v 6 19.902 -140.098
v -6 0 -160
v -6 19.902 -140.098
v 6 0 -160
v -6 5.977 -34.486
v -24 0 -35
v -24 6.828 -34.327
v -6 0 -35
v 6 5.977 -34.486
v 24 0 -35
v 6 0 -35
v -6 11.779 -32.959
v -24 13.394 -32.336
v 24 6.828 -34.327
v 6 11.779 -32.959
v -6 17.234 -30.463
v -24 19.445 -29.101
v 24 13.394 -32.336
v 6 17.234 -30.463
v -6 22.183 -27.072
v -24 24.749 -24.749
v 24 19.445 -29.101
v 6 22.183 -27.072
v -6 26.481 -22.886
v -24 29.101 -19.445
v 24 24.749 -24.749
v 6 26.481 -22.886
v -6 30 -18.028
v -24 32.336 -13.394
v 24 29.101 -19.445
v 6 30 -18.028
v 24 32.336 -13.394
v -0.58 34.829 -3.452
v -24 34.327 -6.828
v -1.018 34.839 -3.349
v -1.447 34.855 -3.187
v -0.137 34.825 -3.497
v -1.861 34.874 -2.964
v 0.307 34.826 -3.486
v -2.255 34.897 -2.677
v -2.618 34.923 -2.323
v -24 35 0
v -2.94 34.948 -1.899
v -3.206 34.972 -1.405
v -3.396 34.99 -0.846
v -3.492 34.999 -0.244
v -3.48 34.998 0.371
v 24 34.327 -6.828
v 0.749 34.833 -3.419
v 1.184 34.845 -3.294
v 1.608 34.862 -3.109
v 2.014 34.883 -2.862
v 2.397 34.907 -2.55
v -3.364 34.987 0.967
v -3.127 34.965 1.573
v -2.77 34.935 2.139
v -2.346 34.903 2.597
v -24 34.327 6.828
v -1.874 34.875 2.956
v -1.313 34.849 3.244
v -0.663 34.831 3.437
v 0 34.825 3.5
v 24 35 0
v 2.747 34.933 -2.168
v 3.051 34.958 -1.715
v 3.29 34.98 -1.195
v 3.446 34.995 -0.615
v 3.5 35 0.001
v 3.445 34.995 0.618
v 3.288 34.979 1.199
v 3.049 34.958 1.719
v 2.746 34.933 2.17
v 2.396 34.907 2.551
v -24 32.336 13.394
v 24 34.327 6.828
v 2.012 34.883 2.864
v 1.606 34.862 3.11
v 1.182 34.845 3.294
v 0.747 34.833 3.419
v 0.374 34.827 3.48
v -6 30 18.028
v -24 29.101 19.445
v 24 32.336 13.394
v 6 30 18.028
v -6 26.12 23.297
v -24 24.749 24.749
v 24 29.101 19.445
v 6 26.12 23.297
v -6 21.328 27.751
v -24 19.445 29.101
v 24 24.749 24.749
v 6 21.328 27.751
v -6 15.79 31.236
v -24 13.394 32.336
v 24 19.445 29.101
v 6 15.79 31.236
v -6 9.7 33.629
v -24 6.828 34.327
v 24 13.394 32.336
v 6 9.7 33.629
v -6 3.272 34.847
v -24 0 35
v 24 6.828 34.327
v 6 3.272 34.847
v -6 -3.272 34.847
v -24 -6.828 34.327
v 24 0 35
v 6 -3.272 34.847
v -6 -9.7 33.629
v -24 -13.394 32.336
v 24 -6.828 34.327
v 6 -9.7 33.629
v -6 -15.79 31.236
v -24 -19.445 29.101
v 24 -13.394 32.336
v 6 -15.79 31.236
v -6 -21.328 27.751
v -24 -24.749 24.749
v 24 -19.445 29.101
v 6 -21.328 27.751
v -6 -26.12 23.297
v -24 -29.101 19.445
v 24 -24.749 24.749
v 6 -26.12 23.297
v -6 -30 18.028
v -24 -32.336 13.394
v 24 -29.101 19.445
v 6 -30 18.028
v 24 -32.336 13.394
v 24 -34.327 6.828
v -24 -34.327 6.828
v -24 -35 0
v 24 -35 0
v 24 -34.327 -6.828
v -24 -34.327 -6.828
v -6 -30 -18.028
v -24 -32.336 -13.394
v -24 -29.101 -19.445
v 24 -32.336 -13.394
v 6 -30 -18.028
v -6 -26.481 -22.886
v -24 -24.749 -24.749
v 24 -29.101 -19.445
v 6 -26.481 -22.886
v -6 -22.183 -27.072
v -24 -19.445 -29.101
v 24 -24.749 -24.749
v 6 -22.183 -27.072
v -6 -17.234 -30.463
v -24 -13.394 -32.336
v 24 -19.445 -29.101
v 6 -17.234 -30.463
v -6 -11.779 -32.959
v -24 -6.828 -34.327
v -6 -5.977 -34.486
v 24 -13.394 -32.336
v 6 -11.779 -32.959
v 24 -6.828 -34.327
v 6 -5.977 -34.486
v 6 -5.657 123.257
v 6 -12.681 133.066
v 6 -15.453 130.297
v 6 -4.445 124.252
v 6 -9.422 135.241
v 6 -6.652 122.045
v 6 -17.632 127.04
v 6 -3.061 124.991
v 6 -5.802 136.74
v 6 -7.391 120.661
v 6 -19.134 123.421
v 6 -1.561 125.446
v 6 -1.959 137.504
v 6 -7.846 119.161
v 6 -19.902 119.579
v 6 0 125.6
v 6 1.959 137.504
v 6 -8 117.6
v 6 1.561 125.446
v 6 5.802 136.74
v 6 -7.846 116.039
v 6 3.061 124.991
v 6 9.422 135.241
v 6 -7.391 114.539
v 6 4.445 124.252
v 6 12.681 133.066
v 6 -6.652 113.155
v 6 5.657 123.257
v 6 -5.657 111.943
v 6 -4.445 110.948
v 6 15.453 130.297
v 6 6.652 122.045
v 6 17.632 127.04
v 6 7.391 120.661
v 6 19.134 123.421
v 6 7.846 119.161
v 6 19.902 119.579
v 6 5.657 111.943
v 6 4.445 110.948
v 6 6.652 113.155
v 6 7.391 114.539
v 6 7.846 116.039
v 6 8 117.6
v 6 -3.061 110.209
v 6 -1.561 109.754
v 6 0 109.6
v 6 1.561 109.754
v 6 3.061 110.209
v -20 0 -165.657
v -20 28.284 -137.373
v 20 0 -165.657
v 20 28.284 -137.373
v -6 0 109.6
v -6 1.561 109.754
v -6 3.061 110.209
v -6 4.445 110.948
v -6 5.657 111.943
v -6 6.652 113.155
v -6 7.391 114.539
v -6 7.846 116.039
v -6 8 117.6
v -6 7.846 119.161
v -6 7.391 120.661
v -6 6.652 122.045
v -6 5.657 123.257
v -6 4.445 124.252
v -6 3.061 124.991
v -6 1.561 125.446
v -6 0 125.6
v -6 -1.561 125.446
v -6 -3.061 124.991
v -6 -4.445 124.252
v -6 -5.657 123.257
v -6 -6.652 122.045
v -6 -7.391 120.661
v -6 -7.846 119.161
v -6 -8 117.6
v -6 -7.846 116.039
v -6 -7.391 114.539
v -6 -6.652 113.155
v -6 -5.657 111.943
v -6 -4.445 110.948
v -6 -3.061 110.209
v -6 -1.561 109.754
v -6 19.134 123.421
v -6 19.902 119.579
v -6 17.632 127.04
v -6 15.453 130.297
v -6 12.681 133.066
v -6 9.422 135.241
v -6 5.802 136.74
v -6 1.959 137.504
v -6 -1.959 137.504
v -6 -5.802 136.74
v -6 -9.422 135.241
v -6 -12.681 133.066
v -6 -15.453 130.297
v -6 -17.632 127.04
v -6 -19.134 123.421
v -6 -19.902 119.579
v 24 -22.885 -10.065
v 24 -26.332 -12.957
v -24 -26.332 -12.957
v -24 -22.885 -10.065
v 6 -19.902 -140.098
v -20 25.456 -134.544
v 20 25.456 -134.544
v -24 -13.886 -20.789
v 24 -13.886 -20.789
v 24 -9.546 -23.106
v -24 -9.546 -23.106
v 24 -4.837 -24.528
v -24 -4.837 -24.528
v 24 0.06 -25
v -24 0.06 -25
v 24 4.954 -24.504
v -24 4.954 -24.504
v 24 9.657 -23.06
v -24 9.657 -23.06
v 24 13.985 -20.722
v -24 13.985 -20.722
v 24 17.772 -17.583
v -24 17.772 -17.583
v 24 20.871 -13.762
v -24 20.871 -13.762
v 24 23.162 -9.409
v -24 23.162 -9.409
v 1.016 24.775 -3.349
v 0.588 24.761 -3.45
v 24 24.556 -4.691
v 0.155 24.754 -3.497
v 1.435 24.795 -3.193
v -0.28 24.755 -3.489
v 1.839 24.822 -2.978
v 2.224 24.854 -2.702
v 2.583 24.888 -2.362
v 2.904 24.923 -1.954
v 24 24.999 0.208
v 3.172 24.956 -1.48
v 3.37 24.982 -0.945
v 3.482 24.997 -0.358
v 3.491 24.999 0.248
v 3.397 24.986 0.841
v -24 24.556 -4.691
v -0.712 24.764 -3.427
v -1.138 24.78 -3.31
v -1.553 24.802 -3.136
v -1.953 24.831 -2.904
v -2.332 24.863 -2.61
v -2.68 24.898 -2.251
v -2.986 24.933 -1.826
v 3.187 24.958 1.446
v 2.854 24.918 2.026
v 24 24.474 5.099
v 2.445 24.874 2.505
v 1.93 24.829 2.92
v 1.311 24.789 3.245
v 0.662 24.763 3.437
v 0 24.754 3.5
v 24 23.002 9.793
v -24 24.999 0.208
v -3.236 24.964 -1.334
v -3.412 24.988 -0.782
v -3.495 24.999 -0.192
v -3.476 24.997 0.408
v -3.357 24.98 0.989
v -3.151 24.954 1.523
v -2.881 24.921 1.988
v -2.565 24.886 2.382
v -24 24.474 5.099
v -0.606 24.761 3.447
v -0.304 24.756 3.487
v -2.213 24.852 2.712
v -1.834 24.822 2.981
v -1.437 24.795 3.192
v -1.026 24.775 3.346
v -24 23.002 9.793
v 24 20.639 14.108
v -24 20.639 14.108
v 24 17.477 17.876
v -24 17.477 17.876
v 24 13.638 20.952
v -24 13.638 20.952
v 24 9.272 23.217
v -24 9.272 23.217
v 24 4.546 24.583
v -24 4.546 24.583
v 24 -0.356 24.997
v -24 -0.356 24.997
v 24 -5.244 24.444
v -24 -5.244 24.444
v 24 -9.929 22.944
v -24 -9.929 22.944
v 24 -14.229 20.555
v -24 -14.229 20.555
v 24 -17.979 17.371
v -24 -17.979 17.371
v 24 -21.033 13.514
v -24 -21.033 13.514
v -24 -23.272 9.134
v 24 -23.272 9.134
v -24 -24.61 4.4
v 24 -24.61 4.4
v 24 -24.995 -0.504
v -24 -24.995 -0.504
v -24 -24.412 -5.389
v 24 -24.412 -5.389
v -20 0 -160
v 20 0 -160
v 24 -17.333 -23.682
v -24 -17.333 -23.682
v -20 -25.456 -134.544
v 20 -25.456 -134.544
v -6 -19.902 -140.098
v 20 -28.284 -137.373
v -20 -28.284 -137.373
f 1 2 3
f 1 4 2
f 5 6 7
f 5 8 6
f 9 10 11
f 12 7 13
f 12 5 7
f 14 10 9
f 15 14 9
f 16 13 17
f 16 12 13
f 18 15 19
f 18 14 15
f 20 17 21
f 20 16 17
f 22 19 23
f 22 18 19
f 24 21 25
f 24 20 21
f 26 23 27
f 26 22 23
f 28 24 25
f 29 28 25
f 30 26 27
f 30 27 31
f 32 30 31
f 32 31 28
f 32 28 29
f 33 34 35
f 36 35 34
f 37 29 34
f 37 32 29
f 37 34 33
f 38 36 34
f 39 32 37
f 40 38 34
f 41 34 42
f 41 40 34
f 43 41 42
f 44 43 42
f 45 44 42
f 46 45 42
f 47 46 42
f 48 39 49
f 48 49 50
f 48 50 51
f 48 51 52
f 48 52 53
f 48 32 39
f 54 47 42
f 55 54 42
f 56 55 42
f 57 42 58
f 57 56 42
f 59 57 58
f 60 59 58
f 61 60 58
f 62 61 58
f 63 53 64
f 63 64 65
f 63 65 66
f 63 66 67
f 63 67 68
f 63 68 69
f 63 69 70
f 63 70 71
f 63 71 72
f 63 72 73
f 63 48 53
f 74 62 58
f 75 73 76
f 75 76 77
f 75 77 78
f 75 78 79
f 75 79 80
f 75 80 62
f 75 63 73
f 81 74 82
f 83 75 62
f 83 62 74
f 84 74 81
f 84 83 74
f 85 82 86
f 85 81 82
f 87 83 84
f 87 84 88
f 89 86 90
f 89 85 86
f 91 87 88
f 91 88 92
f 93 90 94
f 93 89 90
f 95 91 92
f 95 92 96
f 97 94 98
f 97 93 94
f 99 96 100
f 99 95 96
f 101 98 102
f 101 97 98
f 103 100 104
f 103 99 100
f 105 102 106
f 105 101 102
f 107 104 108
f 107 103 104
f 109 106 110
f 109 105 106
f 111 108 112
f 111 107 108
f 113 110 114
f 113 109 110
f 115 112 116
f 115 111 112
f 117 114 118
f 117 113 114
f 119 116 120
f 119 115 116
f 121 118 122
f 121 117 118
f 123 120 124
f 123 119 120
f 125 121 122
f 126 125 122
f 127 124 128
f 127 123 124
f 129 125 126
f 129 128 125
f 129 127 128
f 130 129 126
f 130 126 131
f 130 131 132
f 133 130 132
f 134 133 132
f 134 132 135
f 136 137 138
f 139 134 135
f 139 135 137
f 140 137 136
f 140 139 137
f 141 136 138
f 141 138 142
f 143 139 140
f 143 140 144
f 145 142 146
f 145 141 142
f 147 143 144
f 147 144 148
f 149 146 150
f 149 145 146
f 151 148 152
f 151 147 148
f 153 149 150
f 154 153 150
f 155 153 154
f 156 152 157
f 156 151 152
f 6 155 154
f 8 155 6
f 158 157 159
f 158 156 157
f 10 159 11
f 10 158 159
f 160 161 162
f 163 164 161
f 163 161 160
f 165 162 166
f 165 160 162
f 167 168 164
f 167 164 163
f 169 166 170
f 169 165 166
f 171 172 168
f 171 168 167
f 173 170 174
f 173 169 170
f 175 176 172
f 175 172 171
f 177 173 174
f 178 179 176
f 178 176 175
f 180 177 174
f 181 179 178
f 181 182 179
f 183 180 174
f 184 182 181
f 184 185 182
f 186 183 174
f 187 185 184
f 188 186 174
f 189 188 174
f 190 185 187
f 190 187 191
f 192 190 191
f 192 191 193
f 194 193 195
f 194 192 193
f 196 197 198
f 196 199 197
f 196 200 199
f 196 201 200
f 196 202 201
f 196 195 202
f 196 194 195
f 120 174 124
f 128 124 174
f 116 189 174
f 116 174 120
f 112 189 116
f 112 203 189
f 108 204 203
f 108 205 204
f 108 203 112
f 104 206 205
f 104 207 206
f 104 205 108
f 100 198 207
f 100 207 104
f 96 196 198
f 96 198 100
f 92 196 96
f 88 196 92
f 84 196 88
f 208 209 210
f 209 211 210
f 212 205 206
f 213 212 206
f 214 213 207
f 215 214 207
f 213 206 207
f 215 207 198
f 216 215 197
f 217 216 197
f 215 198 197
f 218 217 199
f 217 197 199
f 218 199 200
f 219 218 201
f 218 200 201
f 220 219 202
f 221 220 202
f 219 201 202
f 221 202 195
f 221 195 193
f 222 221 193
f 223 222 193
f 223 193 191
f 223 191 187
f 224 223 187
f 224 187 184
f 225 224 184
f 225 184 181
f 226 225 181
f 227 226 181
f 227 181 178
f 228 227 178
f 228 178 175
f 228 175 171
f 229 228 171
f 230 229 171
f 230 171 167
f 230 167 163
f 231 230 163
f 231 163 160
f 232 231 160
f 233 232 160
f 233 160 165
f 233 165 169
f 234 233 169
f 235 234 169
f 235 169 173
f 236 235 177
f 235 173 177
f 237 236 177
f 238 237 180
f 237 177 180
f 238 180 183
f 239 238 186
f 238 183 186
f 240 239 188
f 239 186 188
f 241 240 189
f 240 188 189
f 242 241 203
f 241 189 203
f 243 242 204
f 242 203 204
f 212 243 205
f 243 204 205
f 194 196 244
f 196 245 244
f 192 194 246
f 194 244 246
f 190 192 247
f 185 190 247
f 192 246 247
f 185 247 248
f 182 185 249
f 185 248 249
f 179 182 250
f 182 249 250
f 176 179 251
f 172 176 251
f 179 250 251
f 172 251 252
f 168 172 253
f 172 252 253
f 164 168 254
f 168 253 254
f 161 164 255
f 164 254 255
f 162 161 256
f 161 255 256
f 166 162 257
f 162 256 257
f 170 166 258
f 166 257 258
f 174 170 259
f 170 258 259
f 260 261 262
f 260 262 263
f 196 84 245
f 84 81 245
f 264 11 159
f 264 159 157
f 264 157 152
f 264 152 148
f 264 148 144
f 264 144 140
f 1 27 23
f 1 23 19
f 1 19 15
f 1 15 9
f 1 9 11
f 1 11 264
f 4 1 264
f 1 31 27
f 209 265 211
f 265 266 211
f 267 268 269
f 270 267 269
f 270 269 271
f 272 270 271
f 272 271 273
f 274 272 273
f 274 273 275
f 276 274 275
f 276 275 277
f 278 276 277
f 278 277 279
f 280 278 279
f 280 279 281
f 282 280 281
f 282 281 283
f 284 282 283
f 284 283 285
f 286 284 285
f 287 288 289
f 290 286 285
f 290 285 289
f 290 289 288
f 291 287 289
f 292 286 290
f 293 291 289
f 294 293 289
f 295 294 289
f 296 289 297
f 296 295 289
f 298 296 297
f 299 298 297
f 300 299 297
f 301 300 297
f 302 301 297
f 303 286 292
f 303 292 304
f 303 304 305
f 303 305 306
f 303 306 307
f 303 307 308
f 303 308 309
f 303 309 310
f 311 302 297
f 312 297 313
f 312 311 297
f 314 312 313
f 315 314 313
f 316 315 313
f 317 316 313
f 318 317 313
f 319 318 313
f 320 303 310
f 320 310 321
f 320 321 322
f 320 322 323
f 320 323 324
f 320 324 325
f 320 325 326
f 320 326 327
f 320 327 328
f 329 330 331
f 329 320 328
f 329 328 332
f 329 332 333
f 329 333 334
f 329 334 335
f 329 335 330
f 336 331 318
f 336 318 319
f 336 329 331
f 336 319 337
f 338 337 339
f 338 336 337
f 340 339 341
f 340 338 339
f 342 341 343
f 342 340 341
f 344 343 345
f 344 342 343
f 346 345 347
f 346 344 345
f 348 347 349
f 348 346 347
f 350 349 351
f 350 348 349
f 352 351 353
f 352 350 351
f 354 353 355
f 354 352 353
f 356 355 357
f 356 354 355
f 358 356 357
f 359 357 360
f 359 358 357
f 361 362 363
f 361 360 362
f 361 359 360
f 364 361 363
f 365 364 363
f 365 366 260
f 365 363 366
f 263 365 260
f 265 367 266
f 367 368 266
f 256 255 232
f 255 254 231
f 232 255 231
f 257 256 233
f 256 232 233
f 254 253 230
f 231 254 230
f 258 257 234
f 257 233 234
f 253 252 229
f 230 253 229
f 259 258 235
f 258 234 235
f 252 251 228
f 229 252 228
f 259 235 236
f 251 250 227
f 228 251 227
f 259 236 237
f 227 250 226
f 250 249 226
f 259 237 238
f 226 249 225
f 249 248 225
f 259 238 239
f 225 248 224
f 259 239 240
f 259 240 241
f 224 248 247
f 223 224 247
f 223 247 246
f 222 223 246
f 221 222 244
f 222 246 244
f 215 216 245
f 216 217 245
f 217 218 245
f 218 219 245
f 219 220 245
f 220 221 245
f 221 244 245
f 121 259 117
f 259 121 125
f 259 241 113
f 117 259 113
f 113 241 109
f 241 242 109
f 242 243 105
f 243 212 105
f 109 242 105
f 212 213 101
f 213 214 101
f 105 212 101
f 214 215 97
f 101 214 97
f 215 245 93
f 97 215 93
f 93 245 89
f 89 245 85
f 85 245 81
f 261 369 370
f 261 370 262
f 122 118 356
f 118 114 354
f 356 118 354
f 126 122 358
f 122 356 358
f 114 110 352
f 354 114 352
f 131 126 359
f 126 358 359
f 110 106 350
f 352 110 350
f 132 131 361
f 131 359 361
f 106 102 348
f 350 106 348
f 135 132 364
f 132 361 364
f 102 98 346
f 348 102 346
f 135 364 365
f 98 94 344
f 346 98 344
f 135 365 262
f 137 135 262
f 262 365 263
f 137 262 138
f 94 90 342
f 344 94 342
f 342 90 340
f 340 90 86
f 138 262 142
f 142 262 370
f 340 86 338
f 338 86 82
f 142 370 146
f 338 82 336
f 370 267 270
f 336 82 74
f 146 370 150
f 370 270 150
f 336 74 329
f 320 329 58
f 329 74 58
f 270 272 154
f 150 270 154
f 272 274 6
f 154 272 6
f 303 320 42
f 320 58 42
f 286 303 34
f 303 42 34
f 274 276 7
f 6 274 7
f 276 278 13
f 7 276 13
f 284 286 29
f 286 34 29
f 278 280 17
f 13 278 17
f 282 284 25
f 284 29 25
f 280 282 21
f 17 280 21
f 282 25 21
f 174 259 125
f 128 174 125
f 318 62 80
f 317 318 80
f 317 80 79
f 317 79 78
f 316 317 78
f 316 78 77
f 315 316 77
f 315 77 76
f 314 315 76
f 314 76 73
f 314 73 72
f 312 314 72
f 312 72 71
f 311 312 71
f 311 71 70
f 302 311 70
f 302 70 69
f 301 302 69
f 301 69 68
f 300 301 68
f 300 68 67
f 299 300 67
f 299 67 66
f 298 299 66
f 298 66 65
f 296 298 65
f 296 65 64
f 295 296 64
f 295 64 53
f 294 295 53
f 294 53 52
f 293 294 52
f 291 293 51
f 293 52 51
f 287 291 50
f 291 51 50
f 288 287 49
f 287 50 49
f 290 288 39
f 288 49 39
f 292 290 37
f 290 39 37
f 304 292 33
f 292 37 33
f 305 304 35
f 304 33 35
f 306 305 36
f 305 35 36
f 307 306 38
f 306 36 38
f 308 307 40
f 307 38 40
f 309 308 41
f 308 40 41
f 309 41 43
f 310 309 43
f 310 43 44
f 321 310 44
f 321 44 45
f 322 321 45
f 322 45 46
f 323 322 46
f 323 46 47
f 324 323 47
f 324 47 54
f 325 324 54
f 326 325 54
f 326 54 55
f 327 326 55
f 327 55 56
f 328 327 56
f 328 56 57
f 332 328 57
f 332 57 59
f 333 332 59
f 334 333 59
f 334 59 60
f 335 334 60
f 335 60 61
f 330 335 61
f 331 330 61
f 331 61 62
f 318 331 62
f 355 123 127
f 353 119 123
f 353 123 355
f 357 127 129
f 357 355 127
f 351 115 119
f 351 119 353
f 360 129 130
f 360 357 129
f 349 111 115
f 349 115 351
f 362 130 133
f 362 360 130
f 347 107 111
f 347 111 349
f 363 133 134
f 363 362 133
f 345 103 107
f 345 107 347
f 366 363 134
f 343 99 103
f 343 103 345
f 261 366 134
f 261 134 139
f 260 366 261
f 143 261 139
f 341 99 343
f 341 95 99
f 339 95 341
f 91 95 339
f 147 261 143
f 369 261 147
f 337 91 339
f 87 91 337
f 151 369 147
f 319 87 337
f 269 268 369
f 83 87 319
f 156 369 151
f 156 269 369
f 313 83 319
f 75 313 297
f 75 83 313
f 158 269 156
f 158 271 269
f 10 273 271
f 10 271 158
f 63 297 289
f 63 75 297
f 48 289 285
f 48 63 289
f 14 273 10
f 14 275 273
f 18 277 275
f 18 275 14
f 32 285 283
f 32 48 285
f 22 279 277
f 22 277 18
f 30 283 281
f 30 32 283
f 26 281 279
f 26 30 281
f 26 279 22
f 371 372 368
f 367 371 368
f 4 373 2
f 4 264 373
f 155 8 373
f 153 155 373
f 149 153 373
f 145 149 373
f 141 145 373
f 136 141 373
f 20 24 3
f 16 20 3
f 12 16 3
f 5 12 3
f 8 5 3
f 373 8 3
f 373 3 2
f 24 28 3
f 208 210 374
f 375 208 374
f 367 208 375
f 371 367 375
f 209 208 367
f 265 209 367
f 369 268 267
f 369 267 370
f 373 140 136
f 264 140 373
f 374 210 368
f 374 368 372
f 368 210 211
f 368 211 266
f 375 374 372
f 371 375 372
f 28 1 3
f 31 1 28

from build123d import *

# Parameters (mm, degrees)
SKETCH1_R           = 35
SKETCH1_R_2         = 25
BOSS_EXTRUDE1_DEPTH = 24
BOSS_EXTRUDE2_DEPTH = 6
SKETCH3_R           = 8
CUT_EXTRUDE1_DEPTH  = 15
CUT_EXTRUDE2_DEPTH  = 171.672200431
SKETCH6_R           = 3.5
CUT_EXTRUDE3_DEPTH  = 24
BOSS_EXTRUDE4_DEPTH = 20


with BuildPart() as part:
    # Sketch1 → Boss-Extrude1 (new, symmetric)
    with BuildSketch(Plane(origin=(0, 0, 0), x_dir=(0, 0, -1), z_dir=(1, 0, 0))):
        Circle(SKETCH1_R)
        Circle(SKETCH1_R_2, mode=Mode.SUBTRACT)
    extrude(amount=BOSS_EXTRUDE1_DEPTH, both=True)

    # Sketch2 → Boss-Extrude2 (add, symmetric)
    with BuildSketch(Plane(origin=(0, 0, 0), x_dir=(0, 0, -1), z_dir=(1, 0, 0))):
        with BuildLine():
            ThreePointArc((-18.027756377, -30), (-35, 0), (-18.027756377, 30))
            Line((-18.027756377, 30), (-119.579019246, 19.901846216))
            ThreePointArc((-119.579019246, 19.901846216), (-137.6, 0), (-119.579019246, -19.901846216))
            Line((-119.579019246, -19.901846216), (-18.027756377, -30))
        make_face()
        with BuildLine():
            Line((140.098153784, 19.901846216), (18.027756377, 30))
            ThreePointArc((18.027756377, 30), (35, 0), (18.027756377, -30))
            Line((18.027756377, -30), (140.098153784, -19.901846216))
            Line((140.098153784, -19.901846216), (160, 0))
            Line((160, 0), (140.098153784, 19.901846216))
        make_face()
    extrude(amount=BOSS_EXTRUDE2_DEPTH, both=True)

    # Sketch3 → Cut-Extrude1 (cut)
    with BuildSketch(Plane(origin=(6, 0, 0), x_dir=(0, 0, -1), z_dir=(1, 0, 0))):
        with Locations((-117.6, 0)):
            Circle(SKETCH3_R)
    extrude(amount=-CUT_EXTRUDE1_DEPTH, mode=Mode.SUBTRACT)

    # Sketch5 → Cut-Extrude2 (cut, through all)
    with BuildSketch(Plane(origin=(24, 0, 0), x_dir=(0, 0, -1), z_dir=(1, 0, 0))):
        Polygon((23.681757978, -17.332753361), (12.957135774, -26.331779897), (3.997953594, -15.654642346), (14.722575797, -6.655615811), align=None)
    extrude(amount=-CUT_EXTRUDE2_DEPTH, mode=Mode.SUBTRACT)

    # Sketch6 → Cut-Extrude3 (cut)
    with BuildSketch(Plane(origin=(0, 35, 0), x_dir=(-1, 0, 0), z_dir=(0, 1, 0))):
        with Locations(Location((0, 0, 0), (0, 0, 90))):
            Circle(SKETCH6_R)
    extrude(amount=-CUT_EXTRUDE3_DEPTH, mode=Mode.SUBTRACT)


with BuildPart() as body_2:
    # Sketch11 → Boss-Extrude4 (new, symmetric)
    with BuildSketch(Plane(origin=(0, 0, 0), x_dir=(0, 0, -1), z_dir=(1, 0, 0))):
        Polygon((134.544155877, -25.455844123), (160, 0), (134.544155877, 25.455844123), (137.372583002, 28.284271247), (165.656854249, 0), (137.372583002, -28.284271247), align=None)
    extrude(amount=BOSS_EXTRUDE4_DEPTH, both=True)


solid = Compound([part.part, body_2.part])
